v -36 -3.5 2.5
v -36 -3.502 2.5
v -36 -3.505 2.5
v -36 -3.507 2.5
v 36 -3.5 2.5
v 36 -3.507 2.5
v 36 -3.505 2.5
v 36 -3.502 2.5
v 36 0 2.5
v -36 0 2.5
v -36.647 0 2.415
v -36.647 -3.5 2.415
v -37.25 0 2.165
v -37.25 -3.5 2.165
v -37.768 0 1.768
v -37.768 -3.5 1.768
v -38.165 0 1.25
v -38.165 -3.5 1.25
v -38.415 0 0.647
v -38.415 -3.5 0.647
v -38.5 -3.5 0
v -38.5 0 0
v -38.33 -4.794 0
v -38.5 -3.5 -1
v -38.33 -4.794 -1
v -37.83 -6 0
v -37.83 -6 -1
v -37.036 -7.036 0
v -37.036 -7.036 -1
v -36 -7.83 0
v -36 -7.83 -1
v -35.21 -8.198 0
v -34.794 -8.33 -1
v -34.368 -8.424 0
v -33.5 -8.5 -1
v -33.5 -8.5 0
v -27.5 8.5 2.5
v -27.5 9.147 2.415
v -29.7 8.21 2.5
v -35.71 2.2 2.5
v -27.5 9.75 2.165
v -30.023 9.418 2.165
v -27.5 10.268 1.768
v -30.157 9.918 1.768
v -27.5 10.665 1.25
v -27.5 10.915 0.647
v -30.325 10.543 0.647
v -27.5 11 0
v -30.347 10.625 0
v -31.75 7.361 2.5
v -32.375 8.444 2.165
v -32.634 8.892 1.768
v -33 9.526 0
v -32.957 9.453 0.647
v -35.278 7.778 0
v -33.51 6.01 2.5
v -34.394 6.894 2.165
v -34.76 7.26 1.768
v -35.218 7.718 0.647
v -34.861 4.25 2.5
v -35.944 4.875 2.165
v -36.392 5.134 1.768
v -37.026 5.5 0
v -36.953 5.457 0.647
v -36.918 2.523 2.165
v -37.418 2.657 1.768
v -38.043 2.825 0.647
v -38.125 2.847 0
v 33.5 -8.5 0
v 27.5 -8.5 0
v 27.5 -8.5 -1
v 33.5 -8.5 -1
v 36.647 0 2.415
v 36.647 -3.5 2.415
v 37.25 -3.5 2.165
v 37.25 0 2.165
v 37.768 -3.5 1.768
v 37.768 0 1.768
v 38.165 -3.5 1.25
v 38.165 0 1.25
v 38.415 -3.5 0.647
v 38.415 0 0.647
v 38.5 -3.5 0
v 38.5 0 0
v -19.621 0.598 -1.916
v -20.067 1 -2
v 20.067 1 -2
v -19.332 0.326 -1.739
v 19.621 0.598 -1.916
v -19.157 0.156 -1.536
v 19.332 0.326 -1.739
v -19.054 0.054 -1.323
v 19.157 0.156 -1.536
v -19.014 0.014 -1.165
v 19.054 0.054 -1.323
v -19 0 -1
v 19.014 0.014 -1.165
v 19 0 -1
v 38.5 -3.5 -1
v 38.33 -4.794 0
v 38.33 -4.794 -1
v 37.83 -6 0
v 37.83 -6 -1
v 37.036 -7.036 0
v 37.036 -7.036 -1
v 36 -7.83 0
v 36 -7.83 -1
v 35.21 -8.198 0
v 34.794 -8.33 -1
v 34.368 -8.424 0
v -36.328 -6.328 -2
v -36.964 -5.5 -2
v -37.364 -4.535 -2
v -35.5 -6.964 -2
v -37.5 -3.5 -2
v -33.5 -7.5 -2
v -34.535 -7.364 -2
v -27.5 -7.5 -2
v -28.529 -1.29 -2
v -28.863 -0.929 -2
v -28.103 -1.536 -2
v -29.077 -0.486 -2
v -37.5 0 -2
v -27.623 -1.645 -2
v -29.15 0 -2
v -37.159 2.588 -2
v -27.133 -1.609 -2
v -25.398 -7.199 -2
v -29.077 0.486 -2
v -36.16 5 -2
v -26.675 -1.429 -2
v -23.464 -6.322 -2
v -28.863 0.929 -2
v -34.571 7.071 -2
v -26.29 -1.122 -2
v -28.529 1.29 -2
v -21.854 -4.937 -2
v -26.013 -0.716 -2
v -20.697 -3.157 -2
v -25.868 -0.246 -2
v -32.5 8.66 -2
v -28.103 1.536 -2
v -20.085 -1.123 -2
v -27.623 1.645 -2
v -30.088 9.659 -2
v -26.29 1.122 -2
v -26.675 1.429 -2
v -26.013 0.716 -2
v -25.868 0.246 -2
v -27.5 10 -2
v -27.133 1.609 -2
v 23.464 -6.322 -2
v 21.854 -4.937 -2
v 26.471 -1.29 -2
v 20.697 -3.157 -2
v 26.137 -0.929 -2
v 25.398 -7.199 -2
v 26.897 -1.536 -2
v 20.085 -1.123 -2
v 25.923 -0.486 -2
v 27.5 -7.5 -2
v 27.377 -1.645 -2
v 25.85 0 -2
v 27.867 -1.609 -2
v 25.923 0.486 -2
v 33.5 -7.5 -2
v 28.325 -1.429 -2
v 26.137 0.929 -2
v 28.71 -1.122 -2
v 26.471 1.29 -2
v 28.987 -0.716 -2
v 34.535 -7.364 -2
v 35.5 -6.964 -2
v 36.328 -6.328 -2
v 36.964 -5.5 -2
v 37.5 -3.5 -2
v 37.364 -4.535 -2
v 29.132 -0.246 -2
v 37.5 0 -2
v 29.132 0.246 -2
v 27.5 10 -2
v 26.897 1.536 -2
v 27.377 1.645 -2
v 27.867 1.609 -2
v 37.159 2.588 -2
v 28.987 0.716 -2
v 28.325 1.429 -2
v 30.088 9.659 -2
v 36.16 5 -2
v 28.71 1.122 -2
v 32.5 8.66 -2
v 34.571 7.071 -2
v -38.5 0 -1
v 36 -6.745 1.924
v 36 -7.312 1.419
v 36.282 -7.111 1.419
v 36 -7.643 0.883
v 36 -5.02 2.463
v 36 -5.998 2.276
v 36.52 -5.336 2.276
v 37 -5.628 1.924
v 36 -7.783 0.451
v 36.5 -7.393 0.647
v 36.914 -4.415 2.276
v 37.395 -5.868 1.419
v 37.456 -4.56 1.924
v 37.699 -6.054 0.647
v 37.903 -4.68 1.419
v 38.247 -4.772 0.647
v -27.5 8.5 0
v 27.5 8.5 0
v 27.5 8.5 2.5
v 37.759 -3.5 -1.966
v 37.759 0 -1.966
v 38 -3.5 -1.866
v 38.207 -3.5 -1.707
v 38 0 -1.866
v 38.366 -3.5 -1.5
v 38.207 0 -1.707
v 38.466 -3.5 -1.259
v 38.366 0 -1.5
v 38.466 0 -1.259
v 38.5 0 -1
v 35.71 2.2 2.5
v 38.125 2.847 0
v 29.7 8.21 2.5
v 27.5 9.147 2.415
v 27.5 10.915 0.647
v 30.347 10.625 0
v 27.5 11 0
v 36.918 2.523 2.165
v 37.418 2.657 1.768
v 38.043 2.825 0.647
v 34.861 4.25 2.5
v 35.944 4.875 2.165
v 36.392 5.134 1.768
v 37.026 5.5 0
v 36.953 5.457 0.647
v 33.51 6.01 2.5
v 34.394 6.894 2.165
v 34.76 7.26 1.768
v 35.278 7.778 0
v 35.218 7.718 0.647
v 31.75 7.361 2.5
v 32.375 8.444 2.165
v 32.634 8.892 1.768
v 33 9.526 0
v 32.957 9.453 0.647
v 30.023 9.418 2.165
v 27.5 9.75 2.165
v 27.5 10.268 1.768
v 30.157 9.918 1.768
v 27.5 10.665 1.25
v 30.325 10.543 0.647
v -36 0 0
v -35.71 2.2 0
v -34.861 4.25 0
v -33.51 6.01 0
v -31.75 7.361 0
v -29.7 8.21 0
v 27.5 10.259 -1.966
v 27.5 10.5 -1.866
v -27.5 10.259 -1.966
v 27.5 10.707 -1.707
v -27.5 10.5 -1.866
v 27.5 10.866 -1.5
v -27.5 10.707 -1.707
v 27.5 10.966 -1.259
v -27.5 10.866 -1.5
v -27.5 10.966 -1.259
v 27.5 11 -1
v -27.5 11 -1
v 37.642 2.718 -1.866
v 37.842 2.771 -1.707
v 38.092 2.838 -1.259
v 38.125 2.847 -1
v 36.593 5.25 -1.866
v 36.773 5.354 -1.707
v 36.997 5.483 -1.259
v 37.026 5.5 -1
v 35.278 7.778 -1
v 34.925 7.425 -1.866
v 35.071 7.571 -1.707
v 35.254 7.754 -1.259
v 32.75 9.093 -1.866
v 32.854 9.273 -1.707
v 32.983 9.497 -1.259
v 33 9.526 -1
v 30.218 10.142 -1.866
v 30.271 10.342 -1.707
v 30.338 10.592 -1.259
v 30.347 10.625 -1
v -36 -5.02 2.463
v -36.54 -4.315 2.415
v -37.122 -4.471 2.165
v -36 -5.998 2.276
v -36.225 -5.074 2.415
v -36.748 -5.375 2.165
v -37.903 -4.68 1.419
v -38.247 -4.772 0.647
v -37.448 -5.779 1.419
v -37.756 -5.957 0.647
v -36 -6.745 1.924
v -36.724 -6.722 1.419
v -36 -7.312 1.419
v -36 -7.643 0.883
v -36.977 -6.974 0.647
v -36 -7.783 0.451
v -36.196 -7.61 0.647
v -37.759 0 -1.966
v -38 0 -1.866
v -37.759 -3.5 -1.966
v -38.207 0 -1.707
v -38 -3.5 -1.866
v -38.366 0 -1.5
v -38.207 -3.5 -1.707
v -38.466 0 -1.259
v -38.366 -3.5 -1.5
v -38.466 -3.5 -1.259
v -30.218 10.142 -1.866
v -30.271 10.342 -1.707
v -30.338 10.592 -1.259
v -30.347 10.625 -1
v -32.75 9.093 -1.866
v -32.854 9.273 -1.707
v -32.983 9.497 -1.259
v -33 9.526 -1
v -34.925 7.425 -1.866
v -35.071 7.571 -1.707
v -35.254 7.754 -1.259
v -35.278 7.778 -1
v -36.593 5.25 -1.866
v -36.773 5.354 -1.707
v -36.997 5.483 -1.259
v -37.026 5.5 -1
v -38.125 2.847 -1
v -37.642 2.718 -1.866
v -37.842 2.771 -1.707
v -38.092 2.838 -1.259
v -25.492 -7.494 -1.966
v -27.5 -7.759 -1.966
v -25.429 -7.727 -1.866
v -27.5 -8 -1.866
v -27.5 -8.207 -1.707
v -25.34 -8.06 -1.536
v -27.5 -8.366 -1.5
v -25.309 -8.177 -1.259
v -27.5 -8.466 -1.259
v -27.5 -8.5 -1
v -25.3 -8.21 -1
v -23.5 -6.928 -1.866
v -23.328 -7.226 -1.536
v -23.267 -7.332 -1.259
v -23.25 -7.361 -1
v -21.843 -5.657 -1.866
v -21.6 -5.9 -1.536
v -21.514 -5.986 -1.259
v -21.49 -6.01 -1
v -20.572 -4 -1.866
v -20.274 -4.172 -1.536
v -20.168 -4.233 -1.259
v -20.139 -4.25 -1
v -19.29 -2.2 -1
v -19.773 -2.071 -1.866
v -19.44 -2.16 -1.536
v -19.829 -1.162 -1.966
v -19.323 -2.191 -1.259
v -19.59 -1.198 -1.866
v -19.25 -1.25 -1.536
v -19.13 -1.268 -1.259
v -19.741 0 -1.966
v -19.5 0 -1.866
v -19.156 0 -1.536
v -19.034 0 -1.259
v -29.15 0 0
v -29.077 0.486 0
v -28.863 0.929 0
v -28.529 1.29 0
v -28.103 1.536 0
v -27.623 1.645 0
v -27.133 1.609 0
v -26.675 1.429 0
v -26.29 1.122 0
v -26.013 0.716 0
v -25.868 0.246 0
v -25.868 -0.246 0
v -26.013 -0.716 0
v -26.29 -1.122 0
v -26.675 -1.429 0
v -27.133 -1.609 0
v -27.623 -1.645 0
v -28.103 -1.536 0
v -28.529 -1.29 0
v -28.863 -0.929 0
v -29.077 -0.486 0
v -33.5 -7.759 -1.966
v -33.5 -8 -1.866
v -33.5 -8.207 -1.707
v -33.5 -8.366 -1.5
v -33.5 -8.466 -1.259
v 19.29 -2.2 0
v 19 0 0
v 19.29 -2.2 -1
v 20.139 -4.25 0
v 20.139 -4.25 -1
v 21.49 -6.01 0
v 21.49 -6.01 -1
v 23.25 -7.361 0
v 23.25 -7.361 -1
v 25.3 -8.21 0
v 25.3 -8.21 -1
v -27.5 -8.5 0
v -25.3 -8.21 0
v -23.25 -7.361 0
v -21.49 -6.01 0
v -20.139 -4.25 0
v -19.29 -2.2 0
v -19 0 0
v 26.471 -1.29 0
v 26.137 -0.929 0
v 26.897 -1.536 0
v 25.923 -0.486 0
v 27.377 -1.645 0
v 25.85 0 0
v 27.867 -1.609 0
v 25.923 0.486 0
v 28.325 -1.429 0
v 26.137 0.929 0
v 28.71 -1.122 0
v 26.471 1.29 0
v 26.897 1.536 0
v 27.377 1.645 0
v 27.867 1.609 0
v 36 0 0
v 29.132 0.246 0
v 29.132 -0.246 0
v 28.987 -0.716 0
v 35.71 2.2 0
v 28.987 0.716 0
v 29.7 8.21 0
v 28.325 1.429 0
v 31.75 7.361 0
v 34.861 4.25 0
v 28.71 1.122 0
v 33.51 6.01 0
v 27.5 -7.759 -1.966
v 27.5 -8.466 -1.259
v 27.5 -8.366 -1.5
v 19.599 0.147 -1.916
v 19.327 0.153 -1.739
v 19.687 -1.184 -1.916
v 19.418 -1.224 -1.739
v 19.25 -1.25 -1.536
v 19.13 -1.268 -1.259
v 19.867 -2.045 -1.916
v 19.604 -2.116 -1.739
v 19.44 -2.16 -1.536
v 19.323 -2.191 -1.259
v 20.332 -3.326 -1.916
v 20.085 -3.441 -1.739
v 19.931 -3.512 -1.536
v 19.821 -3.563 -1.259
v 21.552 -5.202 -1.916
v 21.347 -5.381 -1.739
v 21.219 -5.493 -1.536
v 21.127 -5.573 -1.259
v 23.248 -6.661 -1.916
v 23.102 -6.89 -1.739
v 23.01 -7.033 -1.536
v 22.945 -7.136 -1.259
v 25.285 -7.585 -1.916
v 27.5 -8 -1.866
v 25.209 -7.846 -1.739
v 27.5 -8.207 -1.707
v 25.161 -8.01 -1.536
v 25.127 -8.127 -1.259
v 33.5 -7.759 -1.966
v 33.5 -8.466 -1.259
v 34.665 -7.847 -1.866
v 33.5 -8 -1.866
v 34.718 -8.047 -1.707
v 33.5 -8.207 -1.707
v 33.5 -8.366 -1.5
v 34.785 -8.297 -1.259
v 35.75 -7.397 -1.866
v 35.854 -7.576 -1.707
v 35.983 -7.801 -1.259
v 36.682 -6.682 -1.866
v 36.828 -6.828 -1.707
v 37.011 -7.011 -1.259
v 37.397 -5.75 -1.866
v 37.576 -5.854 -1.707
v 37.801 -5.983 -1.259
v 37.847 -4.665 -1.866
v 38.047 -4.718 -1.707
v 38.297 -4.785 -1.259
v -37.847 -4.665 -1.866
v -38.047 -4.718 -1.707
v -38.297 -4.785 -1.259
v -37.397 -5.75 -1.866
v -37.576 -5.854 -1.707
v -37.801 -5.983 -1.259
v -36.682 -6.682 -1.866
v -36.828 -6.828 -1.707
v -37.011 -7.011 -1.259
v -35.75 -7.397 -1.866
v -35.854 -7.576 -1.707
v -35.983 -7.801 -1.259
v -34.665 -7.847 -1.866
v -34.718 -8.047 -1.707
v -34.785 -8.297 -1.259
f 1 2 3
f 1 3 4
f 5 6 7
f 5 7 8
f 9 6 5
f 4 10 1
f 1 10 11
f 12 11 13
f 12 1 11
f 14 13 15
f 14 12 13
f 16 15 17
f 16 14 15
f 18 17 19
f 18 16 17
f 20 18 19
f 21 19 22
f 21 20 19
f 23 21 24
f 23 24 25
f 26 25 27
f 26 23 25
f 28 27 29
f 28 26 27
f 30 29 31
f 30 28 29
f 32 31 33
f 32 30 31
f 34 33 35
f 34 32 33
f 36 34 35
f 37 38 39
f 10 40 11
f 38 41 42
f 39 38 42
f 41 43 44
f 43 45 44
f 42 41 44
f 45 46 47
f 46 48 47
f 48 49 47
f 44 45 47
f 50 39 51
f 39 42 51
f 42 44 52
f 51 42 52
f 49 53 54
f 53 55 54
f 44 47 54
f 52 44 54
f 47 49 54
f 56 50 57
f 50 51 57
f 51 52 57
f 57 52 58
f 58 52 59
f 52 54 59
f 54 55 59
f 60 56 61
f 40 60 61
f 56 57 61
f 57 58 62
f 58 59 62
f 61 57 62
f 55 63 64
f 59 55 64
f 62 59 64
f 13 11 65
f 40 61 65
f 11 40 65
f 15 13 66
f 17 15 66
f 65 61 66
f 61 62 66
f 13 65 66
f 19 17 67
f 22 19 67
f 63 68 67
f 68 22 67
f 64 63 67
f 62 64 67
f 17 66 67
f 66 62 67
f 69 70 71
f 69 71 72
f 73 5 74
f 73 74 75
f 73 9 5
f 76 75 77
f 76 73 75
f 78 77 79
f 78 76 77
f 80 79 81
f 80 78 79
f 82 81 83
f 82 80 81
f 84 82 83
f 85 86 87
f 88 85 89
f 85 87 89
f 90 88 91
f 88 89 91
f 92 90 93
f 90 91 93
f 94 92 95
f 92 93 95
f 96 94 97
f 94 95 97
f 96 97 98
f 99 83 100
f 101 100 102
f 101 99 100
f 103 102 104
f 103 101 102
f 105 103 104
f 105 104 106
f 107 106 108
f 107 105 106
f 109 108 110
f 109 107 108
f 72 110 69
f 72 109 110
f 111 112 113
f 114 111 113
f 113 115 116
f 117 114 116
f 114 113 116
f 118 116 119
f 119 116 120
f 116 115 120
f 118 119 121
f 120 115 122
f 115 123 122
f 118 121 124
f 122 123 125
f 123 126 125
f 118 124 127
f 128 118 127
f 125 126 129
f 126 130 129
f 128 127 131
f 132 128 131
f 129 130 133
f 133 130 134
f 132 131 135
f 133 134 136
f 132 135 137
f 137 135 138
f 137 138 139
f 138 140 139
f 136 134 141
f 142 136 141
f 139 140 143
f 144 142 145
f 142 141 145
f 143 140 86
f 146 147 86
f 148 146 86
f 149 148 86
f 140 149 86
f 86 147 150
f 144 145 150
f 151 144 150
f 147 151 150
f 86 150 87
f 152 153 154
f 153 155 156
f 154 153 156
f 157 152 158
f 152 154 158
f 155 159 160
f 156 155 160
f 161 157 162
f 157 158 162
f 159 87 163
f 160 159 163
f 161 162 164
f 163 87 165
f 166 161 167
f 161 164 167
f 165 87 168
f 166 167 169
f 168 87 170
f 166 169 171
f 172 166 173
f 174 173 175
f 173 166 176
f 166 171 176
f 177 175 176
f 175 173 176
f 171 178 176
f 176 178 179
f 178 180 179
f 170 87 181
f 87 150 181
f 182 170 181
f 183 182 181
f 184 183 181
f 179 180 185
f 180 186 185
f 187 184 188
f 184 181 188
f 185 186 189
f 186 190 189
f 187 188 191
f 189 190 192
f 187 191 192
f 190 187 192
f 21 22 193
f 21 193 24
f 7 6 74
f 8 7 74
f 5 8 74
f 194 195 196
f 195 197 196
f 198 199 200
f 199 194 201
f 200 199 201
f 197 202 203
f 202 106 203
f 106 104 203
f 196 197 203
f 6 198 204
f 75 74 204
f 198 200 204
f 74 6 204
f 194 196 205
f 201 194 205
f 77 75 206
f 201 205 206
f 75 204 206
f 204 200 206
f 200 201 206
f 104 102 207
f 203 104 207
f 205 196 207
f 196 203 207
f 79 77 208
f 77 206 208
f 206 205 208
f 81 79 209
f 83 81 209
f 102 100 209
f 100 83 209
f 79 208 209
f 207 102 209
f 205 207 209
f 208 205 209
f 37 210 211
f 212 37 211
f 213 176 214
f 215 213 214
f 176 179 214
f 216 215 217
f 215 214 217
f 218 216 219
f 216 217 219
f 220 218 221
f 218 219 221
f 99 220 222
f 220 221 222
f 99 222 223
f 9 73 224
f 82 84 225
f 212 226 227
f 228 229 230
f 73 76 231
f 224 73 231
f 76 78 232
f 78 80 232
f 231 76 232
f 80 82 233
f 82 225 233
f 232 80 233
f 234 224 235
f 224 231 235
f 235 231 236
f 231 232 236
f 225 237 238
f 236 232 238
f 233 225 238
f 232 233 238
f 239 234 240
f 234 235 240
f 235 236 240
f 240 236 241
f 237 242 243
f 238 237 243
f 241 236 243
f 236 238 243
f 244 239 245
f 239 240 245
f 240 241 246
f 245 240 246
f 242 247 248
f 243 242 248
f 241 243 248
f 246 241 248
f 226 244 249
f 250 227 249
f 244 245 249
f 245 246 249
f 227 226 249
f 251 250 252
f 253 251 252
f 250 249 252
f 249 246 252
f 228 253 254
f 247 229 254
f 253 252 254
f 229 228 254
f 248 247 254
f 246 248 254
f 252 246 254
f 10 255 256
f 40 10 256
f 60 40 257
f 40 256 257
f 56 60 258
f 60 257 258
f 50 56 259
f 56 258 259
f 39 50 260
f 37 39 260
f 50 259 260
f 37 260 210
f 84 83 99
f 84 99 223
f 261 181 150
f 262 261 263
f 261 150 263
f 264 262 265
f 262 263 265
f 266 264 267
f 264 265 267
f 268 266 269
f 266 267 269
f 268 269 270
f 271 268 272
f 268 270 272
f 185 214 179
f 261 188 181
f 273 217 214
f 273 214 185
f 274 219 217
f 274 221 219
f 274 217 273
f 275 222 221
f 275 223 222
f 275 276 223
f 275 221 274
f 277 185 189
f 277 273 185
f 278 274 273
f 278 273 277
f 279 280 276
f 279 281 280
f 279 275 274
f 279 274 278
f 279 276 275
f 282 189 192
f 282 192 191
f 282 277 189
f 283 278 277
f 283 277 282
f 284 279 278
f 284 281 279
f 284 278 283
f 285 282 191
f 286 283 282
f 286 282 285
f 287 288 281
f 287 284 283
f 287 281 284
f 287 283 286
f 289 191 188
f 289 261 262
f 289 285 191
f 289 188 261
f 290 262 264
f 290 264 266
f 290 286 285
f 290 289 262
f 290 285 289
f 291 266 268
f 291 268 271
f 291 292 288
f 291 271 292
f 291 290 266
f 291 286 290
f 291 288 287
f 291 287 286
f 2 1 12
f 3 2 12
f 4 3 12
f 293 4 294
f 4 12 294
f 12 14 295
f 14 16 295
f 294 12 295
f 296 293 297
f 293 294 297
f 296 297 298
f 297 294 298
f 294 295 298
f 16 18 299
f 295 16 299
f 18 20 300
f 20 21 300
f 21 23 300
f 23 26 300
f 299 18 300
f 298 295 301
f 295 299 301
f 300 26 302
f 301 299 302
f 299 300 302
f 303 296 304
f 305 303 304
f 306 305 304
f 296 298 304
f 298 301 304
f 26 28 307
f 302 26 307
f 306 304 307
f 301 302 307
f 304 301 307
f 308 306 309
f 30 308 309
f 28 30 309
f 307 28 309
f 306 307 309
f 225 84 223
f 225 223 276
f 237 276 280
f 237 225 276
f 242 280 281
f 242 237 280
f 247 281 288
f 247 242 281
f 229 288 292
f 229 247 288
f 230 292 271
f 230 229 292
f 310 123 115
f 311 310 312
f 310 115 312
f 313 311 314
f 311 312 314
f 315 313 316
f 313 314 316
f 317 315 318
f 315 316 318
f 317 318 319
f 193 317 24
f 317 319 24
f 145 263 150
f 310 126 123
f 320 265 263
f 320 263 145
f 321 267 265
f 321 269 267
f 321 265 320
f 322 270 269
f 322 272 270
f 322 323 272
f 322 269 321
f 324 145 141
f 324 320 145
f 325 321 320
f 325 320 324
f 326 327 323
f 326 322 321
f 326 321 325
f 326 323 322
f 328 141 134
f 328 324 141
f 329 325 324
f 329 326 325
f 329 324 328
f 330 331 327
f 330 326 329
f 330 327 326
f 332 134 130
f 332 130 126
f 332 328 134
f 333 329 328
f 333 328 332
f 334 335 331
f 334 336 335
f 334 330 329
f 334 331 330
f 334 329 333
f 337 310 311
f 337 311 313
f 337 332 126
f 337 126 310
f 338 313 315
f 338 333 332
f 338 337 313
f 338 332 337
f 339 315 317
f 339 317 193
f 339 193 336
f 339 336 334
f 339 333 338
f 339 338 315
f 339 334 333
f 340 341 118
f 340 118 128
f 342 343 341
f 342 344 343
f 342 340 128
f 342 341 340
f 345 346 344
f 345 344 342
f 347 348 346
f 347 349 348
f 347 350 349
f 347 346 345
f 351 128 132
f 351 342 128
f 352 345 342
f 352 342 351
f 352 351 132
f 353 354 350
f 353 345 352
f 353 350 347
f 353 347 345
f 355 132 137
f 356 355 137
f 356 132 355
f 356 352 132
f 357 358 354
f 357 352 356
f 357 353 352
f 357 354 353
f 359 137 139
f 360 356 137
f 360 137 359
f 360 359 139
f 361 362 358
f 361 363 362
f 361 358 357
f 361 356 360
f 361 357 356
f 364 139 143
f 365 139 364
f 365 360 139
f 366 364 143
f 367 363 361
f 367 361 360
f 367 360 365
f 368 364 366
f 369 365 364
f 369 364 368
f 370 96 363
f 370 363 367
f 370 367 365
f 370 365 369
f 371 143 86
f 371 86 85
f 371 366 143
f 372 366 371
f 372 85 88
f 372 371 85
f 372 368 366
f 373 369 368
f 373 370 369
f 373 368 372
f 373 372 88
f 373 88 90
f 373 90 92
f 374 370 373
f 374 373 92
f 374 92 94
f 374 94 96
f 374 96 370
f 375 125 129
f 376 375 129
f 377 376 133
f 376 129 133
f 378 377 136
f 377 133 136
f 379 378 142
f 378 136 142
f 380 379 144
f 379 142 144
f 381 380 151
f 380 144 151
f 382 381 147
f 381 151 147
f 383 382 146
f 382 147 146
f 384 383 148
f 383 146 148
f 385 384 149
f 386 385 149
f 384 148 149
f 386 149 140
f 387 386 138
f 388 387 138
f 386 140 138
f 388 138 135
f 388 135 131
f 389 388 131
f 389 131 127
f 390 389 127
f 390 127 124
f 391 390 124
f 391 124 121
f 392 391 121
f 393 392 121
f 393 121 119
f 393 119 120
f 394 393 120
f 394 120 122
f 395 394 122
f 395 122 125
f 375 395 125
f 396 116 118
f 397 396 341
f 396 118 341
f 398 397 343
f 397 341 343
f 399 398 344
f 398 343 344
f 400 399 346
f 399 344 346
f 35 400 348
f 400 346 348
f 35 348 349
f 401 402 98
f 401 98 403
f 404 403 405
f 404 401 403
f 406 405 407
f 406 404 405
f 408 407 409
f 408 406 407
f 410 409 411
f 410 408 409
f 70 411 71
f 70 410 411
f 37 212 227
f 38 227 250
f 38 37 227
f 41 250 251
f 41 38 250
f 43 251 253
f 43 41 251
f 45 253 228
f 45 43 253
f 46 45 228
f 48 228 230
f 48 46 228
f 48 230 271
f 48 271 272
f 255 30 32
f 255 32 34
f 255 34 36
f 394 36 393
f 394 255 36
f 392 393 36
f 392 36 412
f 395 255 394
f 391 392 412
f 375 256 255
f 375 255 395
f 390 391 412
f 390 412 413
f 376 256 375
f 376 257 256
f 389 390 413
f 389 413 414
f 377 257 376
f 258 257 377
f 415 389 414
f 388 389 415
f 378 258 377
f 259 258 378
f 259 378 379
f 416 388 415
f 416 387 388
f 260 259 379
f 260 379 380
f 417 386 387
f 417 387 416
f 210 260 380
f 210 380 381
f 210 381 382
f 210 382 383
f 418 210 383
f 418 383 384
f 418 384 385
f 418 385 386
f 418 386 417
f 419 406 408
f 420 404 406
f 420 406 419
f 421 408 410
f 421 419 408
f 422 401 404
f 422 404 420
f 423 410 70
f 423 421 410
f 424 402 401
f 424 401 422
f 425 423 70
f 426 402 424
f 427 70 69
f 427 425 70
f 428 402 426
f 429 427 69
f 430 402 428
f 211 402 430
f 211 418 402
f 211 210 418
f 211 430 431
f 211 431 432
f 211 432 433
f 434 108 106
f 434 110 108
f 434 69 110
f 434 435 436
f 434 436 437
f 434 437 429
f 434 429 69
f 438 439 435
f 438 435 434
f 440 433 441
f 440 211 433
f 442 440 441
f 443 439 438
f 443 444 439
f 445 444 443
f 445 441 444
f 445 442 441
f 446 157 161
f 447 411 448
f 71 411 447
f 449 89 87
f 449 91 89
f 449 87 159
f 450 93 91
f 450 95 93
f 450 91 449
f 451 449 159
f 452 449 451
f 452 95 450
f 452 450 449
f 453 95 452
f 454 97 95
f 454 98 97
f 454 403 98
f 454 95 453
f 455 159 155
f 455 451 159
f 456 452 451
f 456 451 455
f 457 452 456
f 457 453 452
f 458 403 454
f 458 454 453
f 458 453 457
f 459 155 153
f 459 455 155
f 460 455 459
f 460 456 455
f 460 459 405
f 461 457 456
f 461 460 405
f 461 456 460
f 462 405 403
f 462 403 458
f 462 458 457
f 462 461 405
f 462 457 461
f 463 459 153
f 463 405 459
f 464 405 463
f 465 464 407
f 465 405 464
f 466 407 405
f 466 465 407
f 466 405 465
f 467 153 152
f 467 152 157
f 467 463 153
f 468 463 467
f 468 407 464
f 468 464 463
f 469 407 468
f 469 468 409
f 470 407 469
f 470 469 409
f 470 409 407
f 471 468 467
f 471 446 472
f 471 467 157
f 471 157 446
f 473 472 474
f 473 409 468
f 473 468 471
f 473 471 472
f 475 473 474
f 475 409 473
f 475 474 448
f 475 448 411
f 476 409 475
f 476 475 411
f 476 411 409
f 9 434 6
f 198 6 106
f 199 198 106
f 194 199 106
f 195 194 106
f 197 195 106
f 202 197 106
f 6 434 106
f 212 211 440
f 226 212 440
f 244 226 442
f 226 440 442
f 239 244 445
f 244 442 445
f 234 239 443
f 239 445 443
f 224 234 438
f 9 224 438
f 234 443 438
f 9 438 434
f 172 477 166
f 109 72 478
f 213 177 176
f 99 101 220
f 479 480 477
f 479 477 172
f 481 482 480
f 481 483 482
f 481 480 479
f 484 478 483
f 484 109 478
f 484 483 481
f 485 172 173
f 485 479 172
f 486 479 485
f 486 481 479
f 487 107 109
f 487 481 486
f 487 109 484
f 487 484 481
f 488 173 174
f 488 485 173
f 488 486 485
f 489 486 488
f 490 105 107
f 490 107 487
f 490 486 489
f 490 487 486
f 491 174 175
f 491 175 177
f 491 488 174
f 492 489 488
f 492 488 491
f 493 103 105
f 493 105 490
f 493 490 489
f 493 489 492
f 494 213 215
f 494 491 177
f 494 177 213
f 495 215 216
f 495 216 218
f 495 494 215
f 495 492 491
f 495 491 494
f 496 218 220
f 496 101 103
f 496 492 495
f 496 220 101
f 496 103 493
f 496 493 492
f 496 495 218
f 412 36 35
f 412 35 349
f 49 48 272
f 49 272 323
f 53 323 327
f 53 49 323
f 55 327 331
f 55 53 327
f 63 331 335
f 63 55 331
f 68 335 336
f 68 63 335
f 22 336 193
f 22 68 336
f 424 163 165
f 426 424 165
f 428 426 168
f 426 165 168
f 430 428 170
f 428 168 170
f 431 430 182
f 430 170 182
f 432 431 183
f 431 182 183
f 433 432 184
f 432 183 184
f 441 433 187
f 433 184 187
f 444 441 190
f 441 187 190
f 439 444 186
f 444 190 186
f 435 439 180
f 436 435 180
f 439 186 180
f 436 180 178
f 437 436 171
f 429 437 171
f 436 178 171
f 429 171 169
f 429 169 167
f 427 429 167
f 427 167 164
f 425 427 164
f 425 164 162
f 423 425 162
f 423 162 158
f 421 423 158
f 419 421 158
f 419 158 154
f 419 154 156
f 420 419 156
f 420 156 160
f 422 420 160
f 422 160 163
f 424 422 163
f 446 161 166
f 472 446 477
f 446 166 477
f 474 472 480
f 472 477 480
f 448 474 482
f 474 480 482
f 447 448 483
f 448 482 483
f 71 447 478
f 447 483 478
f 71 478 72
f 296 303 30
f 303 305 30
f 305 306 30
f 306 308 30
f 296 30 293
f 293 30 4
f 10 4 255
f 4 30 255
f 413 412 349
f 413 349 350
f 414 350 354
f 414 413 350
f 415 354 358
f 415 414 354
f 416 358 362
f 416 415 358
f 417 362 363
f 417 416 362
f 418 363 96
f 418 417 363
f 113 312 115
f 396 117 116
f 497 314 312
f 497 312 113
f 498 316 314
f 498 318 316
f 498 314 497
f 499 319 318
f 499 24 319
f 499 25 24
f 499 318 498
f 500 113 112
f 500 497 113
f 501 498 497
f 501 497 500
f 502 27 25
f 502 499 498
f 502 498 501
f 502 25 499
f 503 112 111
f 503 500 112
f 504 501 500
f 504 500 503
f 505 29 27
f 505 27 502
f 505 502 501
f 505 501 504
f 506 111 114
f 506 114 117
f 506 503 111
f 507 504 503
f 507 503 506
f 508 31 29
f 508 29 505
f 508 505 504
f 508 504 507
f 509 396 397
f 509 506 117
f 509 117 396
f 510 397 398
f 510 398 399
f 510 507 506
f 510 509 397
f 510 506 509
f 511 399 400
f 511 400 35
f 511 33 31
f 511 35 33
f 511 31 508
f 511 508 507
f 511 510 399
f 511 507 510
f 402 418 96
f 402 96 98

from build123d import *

# Parameters (mm, degrees)
F1_DEPTH = 2.5
F2_DEPTH = 2
F3_D     = 3.3
F4_R     = 5
F5_R     = 2.49999
F6_R     = 1


# Not quite as in the source:
# - a fillet or chamfer is up to 0.001 mm smaller than in the source, because OpenCascade refuses the exact size


with BuildPart() as f1:
    # F0 (on Top) → F1 (new body)
    with BuildSketch(Plane.XY):
        with BuildLine():
            ThreePointArc((-36, 0), (-33.5104076401, 6.0104076401), (-27.5, 8.5))
            Line((-27.5, 8.5), (27.5, 8.5))
            ThreePointArc((27.5, 8.5), (33.5104076401, 6.0104076401), (36, 0))
            Line((36, 0), (36, -8.5))
            Line((36, -8.5), (38.4999999404, -8.5))
            Line((38.4999999404, -8.5), (38.4999999404, 0))
            ThreePointArc((38.4999999404, 0), (35.2781745509, 7.7781745509), (27.5, 10.9999999404))
            Line((27.5, 10.9999999404), (-27.5, 10.9999999404))
            ThreePointArc((-27.5, 10.9999999404), (-35.2781745509, 7.7781745509), (-38.4999999404, 0))
            Line((-38.4999999404, 0), (-38.4999999404, -8.5))
            Line((-38.4999999404, -8.5), (-36, -8.5))
            Line((-36, -8.5), (-36, 0))
        make_face()
    extrude(amount=F1_DEPTH)

    # F0 (on Top) → F2 (join)
    with BuildSketch(Plane.XY):
        with BuildLine():
            ThreePointArc((-36, 0), (-33.5104076401, 6.0104076401), (-27.5, 8.5))
            Line((-27.5, 8.5), (27.5, 8.5))
            ThreePointArc((27.5, 8.5), (33.5104076401, 6.0104076401), (36, 0))
            Line((36, 0), (36, -8.5))
            Line((36, -8.5), (38.4999999404, -8.5))
            Line((38.4999999404, -8.5), (38.4999999404, 0))
            ThreePointArc((38.4999999404, 0), (35.2781745509, 7.7781745509), (27.5, 10.9999999404))
            Line((27.5, 10.9999999404), (-27.5, 10.9999999404))
            ThreePointArc((-27.5, 10.9999999404), (-35.2781745509, 7.7781745509), (-38.4999999404, 0))
            Line((-38.4999999404, 0), (-38.4999999404, -8.5))
            Line((-38.4999999404, -8.5), (-36, -8.5))
            Line((-36, -8.5), (-36, 0))
        make_face()
        with BuildLine():
            Line((27.5, 8.5), (-27.5, 8.5))
            ThreePointArc((-27.5, 8.5), (-33.5104076401, 6.0104076401), (-36, 0))
            Line((-36, 0), (-36, -8.5))
            Line((-36, -8.5), (-27.5, -8.5))
            ThreePointArc((-27.5, -8.5), (-21.4895923599, -6.0104076401), (-19, 0))
            Line((-19, 0), (19, 0))
            ThreePointArc((19, 0), (21.4895923599, -6.0104076401), (27.5, -8.5))
            Line((27.5, -8.5), (36, -8.5))
            Line((36, -8.5), (36, 0))
            ThreePointArc((36, 0), (33.5104076401, 6.0104076401), (27.5, 8.5))
        make_face()
    extrude(amount=-F2_DEPTH)

    # F3 (through all)
    with Locations(Plane.XY):
        with Locations((27.5, 0), (-27.5, 0)):
            Hole(F3_D / 2)

    # F4
    f4_edges = [f1.edges().sort_by_distance(p)[0] for p in [
        (-38.5, -8.5, 0.25),
        (38.5, -8.5, 0.25),
    ]]
    fillet(f4_edges, radius=F4_R)

    # F5 (radius 2.5 in the source; OpenCascade refuses exactly that, so slightly less here)
    f5_edges = [f1.edges().sort_by_distance(p)[0] for p in [
        (0, 11, 2.5),
    ]]
    fillet(f5_edges, radius=F5_R)

    # F6
    f6_edges = [f1.edges().sort_by_distance(p)[0] for p in [
        (0, 11, -2),
        (0, 0, -2),
    ]]
    fillet(f6_edges, radius=F6_R)


solid = f1.part
